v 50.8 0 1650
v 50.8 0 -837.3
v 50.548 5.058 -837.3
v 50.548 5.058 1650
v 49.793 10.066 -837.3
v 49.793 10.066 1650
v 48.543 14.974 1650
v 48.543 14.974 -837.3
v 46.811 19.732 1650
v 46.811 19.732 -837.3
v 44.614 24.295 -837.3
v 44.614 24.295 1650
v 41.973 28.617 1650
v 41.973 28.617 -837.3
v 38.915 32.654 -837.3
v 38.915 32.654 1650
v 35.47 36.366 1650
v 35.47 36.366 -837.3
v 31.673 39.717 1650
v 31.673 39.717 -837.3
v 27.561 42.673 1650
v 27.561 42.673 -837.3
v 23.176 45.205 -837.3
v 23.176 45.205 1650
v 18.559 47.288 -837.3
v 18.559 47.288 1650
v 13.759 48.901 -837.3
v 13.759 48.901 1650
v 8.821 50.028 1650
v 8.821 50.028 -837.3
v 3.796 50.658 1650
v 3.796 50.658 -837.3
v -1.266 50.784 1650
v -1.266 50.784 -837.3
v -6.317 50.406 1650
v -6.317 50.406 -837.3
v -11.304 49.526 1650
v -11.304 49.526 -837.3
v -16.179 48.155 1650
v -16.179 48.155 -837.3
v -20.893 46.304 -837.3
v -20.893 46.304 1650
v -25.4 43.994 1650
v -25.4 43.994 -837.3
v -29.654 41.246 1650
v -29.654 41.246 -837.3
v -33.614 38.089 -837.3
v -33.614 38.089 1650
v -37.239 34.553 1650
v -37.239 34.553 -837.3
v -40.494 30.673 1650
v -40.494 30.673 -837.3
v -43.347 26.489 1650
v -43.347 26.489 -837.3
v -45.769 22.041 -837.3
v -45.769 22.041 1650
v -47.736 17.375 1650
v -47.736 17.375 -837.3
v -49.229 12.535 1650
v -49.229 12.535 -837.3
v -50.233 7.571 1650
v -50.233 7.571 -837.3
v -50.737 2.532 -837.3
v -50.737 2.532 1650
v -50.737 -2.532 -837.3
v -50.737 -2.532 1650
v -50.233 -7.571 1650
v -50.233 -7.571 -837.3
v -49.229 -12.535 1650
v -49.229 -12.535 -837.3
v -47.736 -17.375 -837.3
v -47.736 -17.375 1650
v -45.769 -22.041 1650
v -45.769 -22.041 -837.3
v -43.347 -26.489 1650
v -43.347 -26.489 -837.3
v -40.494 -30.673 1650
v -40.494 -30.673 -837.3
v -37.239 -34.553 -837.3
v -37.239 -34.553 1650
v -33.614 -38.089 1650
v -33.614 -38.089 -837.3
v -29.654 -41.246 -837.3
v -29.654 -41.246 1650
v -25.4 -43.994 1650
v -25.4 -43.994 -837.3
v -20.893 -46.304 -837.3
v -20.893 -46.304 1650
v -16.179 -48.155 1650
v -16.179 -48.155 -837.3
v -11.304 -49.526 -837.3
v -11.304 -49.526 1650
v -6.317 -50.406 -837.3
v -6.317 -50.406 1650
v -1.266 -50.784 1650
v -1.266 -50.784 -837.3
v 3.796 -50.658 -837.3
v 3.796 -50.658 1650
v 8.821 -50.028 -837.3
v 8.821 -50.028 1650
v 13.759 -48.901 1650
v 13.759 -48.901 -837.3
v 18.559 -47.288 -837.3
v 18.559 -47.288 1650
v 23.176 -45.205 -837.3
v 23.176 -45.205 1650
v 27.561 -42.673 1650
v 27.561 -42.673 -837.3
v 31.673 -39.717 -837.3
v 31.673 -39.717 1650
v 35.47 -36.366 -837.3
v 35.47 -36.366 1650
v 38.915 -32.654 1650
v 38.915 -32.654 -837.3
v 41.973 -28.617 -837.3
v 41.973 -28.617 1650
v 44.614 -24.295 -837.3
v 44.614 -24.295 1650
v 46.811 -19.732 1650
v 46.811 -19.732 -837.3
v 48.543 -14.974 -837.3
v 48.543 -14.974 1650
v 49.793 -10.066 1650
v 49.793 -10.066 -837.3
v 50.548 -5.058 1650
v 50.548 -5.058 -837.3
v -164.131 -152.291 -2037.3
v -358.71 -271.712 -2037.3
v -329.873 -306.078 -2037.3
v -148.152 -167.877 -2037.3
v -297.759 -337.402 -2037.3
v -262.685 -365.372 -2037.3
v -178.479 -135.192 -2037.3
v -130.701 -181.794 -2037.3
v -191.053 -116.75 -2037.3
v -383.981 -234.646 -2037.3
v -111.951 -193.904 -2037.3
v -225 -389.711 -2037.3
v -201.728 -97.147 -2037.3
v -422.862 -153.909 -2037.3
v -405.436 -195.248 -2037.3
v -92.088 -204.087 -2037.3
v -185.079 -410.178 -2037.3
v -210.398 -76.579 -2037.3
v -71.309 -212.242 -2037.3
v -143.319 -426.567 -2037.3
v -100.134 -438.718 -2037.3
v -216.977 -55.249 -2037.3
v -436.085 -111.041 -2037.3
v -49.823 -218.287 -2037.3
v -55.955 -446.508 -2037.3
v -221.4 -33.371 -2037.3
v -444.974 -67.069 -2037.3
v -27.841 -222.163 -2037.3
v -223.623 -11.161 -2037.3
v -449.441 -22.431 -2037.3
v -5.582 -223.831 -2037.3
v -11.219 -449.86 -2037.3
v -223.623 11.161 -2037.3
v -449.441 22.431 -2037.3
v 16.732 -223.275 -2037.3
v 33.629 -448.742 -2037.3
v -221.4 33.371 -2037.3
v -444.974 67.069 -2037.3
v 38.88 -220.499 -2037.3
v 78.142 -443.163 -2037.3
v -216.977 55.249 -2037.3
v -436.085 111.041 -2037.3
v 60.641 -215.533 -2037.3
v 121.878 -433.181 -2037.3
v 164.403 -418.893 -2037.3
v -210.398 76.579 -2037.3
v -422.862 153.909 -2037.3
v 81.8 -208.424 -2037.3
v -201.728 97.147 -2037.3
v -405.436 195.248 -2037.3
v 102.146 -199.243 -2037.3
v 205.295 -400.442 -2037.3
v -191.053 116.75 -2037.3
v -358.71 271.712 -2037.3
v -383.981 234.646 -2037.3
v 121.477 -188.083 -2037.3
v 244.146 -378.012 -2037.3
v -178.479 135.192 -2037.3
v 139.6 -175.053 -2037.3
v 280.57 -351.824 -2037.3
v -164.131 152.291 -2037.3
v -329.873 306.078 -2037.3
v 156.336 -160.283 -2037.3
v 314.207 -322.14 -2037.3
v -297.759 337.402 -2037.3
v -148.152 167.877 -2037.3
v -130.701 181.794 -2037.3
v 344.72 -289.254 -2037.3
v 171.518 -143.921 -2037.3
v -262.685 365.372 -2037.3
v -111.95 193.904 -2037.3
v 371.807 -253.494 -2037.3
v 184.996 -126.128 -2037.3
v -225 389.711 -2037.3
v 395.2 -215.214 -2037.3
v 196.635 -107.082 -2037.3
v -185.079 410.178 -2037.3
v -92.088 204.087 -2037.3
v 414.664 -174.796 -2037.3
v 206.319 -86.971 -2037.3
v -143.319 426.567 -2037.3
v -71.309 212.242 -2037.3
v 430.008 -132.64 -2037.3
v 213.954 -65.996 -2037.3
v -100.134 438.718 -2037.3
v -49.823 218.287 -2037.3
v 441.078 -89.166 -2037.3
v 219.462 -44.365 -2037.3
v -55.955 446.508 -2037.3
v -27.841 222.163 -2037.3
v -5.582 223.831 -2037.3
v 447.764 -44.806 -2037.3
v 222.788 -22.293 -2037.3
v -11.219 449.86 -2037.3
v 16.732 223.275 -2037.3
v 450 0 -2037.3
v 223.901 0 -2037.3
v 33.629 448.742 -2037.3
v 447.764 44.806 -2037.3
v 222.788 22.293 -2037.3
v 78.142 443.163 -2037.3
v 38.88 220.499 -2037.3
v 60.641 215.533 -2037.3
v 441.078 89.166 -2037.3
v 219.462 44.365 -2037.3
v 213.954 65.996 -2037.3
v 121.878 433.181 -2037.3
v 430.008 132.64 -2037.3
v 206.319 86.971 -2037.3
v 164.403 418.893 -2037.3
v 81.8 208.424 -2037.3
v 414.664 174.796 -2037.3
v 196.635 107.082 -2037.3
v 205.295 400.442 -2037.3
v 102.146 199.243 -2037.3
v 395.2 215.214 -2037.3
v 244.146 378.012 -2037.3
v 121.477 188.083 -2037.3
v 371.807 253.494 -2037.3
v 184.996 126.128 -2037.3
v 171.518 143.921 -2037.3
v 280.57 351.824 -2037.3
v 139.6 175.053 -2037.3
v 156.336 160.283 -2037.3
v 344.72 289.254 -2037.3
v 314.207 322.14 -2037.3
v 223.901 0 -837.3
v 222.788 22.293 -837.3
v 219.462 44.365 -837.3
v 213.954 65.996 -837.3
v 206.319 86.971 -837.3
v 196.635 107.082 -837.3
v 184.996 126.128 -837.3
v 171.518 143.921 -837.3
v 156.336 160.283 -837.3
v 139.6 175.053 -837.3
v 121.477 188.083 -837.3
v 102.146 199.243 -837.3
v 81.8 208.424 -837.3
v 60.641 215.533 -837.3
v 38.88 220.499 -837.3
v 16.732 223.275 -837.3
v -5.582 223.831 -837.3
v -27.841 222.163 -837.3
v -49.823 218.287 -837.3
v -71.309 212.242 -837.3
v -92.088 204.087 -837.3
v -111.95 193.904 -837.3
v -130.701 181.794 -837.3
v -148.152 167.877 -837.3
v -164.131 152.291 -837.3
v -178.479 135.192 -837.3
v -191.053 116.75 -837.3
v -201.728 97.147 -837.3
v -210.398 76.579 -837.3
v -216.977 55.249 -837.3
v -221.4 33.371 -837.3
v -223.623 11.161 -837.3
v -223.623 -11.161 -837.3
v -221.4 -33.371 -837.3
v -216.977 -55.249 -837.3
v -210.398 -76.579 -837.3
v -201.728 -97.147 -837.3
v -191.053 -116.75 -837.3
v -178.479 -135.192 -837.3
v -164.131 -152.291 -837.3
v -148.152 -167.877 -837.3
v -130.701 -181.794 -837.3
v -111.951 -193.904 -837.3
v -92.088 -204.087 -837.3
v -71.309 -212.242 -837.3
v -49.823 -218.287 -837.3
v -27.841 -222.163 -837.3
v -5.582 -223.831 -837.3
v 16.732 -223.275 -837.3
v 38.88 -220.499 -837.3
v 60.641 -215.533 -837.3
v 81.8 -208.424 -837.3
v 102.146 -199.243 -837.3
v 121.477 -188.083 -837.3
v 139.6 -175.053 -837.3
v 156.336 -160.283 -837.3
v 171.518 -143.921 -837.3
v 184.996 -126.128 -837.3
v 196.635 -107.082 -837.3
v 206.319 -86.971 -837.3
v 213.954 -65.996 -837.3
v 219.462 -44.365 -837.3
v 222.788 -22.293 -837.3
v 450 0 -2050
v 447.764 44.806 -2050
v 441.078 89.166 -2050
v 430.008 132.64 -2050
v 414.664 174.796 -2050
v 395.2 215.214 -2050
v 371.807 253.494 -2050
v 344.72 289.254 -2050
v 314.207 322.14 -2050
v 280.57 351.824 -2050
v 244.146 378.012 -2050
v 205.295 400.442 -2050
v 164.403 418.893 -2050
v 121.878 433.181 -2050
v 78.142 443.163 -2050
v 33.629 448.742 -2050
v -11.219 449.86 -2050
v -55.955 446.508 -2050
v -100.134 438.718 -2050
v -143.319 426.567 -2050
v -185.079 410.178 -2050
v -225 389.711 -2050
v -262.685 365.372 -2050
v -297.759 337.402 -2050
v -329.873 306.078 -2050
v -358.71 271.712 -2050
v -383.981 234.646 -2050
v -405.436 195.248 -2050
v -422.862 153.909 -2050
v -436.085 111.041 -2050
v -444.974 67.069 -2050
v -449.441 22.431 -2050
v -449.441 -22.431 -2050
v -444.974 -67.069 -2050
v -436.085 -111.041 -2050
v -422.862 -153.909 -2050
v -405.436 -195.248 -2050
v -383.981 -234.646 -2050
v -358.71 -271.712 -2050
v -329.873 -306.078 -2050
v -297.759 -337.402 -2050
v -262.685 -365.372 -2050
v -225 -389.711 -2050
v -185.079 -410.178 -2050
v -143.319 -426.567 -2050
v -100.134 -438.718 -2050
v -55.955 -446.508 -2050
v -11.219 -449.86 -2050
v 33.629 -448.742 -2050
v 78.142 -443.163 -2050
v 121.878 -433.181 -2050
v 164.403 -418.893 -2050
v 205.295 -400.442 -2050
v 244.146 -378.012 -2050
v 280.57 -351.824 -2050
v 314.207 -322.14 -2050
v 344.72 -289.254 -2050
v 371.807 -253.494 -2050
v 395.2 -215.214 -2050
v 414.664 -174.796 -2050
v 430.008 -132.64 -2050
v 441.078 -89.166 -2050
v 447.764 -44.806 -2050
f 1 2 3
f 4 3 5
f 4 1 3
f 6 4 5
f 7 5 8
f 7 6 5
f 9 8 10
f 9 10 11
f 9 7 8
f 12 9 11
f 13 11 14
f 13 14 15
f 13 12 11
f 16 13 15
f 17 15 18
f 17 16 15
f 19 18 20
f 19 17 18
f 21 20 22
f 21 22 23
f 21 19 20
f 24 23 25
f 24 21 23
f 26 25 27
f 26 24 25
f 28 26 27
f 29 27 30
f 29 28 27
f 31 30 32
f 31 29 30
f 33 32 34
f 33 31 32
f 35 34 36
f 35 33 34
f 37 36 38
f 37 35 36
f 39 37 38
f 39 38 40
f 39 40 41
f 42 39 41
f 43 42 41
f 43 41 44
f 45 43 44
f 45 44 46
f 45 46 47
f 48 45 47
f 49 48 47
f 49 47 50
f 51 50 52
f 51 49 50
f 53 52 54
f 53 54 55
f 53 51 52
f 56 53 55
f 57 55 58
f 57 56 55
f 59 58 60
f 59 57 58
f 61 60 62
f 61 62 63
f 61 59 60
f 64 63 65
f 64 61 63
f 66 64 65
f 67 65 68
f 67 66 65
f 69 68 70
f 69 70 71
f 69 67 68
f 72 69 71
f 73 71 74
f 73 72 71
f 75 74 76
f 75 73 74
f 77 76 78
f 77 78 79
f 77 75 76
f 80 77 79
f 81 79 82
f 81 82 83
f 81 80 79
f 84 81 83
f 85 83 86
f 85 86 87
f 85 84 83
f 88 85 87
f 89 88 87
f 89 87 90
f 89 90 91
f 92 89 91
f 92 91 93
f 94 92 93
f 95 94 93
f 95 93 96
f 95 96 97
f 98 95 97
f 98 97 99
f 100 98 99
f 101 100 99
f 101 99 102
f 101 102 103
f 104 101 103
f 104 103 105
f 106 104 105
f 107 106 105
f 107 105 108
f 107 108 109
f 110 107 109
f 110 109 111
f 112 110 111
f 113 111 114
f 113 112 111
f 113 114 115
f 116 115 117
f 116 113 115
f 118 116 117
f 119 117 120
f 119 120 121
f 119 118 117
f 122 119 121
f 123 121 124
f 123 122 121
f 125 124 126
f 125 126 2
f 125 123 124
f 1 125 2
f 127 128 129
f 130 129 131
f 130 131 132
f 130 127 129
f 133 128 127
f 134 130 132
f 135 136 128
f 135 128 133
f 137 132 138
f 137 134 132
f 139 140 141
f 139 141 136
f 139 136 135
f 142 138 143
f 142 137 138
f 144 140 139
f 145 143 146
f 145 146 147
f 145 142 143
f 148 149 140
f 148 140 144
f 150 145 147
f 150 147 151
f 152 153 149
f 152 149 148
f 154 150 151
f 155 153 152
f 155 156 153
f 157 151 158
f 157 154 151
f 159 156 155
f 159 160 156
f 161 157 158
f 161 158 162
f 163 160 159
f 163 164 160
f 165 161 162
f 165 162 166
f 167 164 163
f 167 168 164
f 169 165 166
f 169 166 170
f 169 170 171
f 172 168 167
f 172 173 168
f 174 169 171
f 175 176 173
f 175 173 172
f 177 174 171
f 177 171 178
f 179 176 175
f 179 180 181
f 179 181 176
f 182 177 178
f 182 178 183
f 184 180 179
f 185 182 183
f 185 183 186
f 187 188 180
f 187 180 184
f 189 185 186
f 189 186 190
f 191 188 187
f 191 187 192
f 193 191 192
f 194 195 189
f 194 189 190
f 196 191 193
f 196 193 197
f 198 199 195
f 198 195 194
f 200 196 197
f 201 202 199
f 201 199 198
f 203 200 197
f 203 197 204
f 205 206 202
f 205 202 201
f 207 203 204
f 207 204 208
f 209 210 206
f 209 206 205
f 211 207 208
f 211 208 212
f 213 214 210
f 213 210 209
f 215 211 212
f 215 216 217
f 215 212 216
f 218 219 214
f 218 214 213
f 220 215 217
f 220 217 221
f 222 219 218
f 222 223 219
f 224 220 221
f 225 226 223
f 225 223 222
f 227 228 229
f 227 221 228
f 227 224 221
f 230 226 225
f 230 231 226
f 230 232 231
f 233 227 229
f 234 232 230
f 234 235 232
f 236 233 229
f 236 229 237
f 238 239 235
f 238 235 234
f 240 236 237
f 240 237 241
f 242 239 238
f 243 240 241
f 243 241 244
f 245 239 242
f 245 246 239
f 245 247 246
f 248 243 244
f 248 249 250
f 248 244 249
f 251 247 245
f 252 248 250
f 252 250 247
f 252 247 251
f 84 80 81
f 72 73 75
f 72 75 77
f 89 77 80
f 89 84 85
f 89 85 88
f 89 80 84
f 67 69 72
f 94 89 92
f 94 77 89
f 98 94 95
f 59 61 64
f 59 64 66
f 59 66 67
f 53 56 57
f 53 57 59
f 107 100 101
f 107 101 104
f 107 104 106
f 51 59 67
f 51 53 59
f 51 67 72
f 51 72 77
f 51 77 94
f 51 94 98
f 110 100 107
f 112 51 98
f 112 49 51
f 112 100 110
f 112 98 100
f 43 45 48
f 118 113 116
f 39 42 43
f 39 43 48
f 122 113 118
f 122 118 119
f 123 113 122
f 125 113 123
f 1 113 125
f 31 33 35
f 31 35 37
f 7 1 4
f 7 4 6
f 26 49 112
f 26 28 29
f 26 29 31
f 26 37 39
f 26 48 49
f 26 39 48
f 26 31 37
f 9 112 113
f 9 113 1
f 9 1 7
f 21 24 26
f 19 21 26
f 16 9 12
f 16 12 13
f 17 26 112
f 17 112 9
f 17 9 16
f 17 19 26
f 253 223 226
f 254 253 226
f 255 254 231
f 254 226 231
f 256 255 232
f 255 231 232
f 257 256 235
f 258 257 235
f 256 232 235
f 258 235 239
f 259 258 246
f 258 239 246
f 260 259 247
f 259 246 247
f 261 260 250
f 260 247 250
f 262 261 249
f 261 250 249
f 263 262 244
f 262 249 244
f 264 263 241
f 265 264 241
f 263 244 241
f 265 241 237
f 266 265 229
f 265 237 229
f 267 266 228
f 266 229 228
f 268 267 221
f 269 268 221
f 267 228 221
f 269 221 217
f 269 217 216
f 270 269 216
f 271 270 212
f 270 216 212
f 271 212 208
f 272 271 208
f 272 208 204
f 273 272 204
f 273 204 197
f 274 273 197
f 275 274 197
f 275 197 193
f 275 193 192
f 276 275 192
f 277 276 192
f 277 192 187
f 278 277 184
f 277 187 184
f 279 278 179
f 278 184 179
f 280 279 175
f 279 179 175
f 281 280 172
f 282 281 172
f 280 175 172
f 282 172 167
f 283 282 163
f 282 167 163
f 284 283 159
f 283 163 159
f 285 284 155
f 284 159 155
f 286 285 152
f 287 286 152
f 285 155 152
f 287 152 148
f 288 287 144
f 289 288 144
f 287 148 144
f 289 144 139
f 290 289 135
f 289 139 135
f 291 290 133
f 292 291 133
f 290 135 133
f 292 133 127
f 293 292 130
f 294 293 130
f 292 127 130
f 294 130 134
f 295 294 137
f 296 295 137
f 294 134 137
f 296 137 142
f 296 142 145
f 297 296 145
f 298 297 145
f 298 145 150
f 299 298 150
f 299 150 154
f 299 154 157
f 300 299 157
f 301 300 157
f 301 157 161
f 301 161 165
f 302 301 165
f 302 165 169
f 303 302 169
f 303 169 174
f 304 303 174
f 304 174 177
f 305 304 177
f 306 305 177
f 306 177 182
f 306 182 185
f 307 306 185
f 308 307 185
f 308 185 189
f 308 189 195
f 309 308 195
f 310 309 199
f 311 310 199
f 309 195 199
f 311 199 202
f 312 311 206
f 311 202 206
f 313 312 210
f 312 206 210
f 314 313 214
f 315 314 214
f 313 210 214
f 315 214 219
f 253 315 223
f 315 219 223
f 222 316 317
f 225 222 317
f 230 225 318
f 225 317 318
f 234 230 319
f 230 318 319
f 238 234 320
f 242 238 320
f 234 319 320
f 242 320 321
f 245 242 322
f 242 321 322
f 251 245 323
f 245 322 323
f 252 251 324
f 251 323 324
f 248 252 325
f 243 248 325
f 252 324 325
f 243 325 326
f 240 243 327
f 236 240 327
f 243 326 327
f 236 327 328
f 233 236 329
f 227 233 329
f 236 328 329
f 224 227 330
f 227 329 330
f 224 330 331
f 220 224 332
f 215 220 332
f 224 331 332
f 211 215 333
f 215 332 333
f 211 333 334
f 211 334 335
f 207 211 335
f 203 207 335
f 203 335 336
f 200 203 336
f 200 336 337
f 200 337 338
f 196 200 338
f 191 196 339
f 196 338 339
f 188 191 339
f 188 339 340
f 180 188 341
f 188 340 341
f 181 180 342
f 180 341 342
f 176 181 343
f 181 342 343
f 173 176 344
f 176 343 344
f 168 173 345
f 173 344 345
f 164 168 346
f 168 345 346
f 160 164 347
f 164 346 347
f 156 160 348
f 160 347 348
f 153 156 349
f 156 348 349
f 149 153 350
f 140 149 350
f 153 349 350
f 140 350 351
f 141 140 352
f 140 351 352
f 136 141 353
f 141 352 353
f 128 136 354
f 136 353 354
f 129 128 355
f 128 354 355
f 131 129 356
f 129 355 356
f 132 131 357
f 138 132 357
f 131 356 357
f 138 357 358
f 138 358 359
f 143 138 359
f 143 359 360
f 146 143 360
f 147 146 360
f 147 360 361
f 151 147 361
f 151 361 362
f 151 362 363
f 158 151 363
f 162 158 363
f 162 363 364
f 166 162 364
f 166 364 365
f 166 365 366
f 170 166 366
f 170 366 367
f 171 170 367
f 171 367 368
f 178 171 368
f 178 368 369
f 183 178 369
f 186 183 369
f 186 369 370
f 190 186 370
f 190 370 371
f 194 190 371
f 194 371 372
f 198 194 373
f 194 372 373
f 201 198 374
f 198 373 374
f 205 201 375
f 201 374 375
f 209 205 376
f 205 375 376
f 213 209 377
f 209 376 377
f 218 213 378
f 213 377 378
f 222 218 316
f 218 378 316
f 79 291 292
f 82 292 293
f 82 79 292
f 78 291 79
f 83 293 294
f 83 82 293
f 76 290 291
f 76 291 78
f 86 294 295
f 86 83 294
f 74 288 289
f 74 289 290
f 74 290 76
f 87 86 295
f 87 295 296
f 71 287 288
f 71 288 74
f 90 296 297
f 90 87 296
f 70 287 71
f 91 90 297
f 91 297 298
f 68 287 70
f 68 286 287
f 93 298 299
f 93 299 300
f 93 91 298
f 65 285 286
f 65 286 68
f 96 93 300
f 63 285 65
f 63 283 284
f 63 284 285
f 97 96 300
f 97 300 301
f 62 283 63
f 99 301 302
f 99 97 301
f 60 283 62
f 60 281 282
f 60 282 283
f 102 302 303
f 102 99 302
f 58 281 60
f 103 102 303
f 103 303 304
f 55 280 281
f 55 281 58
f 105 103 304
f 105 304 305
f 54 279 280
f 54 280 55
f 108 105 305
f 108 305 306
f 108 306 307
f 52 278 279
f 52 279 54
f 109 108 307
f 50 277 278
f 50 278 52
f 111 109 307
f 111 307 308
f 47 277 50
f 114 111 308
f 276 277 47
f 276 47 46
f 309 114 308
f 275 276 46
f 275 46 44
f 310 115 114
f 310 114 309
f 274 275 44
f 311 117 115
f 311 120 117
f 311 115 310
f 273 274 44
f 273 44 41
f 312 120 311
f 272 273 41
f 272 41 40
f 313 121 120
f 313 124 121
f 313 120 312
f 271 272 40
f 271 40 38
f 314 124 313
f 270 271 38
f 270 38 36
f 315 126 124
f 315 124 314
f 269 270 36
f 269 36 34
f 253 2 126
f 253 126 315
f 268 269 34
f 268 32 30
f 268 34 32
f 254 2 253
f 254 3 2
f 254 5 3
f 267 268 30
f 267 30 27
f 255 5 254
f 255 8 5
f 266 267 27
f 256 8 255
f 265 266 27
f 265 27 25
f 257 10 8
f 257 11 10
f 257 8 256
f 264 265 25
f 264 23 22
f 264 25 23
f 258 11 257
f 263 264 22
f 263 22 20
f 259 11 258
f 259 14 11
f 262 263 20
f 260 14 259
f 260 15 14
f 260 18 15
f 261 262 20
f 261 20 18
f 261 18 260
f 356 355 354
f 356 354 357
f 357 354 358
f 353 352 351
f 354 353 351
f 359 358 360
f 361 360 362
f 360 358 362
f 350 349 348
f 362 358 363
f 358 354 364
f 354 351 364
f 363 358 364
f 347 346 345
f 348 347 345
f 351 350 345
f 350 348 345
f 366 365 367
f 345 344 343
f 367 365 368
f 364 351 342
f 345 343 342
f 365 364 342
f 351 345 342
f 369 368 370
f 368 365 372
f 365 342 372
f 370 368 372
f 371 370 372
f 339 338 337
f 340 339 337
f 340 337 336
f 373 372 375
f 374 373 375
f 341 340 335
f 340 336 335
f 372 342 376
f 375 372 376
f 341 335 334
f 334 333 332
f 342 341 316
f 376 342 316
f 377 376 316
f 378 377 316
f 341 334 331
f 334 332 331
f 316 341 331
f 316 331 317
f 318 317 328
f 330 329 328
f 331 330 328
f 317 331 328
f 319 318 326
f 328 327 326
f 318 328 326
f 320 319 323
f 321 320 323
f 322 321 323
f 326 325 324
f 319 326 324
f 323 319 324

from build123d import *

# Parameters (mm, degrees)
SKETCH1_R                = 50.8
BOSS_EXTRUDE1_DEPTH      = 1650
BOSS_EXTRUDE1_DEPTH_BACK = 2050
SKETCH2_R                = 450
BOSS_EXTRUDE2_DEPTH      = 12.7
SKETCH3_R                = 223.901
BOSS_EXTRUDE3_DEPTH      = 1200


with BuildPart() as part:
    # Sketch1 → Boss-Extrude1 (new body, two sides)
    with BuildSketch(Plane.XY) as boss_extrude1_sk:
        Circle(SKETCH1_R)
    extrude(amount=BOSS_EXTRUDE1_DEPTH)
    extrude(boss_extrude1_sk.sketch, amount=-BOSS_EXTRUDE1_DEPTH_BACK)

    # Sketch2 → Boss-Extrude2 (add)
    with BuildSketch(Plane.XY.offset(-2050)):
        Circle(SKETCH2_R)
    extrude(amount=BOSS_EXTRUDE2_DEPTH)

    # Sketch3 → Boss-Extrude3 (add)
    with BuildSketch(Plane.XY.offset(-2037.3)):
        Circle(SKETCH3_R)
    extrude(amount=BOSS_EXTRUDE3_DEPTH)


solid = part.part
